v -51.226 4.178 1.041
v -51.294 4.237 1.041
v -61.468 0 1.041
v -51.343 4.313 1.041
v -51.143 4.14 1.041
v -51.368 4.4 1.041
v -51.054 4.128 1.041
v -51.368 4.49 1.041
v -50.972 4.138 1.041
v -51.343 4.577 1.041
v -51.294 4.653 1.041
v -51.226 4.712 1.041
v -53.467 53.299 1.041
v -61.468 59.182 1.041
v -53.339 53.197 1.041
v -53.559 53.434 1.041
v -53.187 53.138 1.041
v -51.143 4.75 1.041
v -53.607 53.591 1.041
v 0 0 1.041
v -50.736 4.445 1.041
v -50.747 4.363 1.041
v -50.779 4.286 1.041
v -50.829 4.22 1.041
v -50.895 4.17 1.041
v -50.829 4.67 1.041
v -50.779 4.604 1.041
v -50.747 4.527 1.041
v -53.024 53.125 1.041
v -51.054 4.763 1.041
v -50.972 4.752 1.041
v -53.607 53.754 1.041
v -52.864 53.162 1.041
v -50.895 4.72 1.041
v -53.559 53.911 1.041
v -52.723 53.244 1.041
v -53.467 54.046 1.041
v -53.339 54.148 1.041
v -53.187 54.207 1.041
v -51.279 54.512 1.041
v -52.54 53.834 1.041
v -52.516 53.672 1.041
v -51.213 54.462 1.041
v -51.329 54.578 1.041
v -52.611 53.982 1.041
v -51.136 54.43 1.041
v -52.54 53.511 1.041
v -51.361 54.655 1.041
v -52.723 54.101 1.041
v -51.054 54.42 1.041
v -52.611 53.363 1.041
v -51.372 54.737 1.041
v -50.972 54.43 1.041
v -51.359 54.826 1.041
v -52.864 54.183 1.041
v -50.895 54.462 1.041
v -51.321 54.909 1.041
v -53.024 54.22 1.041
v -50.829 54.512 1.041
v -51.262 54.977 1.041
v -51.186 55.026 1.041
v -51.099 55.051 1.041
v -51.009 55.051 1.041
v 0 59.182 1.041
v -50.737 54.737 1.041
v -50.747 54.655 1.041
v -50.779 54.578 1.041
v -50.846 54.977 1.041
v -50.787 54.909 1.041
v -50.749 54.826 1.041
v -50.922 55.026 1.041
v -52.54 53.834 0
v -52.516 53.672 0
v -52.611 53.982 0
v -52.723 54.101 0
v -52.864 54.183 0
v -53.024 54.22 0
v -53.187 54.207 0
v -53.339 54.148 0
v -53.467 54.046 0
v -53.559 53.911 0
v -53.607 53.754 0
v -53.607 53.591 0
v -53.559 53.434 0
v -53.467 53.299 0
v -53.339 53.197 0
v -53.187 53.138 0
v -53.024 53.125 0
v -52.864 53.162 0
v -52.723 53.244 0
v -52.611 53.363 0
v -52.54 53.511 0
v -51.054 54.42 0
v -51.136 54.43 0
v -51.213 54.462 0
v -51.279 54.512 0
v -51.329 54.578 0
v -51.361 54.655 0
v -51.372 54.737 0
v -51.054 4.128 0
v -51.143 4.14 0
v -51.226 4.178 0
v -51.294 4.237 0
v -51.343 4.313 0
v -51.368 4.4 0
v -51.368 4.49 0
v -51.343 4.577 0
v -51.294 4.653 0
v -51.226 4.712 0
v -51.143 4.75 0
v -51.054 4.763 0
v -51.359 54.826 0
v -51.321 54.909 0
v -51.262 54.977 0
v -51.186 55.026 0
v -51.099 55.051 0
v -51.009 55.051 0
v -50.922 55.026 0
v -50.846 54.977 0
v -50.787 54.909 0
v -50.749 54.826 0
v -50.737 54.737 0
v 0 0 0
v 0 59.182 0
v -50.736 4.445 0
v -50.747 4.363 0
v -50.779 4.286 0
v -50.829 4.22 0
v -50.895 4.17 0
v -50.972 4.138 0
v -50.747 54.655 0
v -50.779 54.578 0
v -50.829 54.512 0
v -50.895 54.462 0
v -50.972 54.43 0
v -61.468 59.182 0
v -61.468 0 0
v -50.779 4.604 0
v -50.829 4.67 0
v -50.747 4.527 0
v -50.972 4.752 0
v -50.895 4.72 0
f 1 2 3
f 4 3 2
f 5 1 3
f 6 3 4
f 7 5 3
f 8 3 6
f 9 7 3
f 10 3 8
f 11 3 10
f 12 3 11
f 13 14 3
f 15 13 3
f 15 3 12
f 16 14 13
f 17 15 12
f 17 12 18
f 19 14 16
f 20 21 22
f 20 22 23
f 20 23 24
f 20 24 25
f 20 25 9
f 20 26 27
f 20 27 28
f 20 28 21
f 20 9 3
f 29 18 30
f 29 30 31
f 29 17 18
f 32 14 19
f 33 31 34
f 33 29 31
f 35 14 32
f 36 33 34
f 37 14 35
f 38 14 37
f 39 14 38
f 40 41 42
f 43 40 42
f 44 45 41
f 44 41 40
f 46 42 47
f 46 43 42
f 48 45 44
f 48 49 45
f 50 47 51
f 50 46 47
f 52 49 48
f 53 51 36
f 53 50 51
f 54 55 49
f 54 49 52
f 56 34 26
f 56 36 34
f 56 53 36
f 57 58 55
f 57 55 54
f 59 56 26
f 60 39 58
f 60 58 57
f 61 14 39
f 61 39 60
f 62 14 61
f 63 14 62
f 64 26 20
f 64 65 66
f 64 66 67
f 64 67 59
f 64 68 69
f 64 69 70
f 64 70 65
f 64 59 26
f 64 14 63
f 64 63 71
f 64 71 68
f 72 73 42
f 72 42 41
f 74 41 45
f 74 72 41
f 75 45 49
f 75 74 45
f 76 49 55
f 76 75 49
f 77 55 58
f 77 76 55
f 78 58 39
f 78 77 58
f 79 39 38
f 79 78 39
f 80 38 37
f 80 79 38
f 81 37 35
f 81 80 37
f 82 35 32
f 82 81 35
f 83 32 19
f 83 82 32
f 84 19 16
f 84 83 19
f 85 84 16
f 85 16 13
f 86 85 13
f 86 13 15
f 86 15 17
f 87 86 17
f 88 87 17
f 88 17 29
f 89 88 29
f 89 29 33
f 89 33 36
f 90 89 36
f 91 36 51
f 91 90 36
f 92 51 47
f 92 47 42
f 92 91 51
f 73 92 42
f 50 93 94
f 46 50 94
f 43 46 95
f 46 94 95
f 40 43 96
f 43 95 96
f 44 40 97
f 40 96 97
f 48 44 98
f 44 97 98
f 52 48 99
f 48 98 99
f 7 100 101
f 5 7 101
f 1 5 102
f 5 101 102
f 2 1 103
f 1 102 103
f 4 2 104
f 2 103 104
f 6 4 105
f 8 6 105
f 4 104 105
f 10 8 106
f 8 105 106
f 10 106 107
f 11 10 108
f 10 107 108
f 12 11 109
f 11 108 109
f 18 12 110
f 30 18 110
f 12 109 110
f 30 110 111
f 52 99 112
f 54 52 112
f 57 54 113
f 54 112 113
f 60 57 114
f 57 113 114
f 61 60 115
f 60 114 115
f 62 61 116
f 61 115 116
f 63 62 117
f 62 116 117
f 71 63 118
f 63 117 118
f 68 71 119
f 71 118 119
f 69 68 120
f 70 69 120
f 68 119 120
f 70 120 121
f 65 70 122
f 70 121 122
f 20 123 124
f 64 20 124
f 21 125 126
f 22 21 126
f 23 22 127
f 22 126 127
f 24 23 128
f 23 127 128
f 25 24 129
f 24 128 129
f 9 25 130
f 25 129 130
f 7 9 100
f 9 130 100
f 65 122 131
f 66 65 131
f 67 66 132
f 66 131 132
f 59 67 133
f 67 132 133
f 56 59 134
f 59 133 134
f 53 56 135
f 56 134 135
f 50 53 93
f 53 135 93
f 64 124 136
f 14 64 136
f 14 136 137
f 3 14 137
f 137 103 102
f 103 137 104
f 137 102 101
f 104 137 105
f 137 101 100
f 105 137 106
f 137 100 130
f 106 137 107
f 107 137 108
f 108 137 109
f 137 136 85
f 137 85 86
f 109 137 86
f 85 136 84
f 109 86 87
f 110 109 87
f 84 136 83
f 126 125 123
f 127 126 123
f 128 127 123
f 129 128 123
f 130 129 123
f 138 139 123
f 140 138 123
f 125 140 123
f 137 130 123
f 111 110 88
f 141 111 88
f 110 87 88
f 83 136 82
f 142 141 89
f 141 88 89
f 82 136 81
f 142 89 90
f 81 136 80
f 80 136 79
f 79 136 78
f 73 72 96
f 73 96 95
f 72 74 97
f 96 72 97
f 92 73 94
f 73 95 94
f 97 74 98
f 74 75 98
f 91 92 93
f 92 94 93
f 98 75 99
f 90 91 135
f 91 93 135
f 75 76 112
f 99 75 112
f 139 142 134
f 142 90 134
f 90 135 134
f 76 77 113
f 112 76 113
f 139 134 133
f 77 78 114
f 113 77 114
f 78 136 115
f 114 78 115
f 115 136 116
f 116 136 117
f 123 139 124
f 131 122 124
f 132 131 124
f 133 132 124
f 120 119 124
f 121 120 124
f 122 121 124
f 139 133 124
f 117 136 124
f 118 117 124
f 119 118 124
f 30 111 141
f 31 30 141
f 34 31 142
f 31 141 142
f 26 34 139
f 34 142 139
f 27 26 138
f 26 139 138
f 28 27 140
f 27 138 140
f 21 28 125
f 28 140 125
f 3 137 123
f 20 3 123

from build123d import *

# Parameters (mm, degrees)
F0_R     = 0.5486564272
F1_DEPTH = 1.0414


with BuildPart() as f1:
    # F0 (on Top) → F1 (new body)
    with BuildSketch(Plane.XY):
        with BuildLine():
            Line((-51.054, 0), (0, 0))
            Line((0, 0), (0, 59.182))
            Line((0, 59.182), (-61.468, 59.182))
            Line((-61.468, 59.182), (-61.468, 54.737))
            Line((-61.468, 54.737), (-51.3715, 54.737))
            ThreePointArc((-51.3715, 54.737), (-51.054, 55.0545), (-50.7365, 54.737))
            ThreePointArc((-50.7365, 54.737), (-50.829493597, 54.512493597), (-51.054, 54.4195))
            Line((-51.054, 54.4195), (-51.054, 4.7625))
            ThreePointArc((-51.054, 4.7625), (-50.829493597, 4.669506403), (-50.7365, 4.445))
            ThreePointArc((-50.7365, 4.445), (-50.829493597, 4.220493597), (-51.054, 4.1275))
            Line((-51.054, 4.1275), (-51.054, 0))
        make_face()
        with BuildLine():
            Line((-61.468, 0), (-51.054, 0))
            Line((-51.054, 0), (-51.054, 4.1275))
            ThreePointArc((-51.054, 4.1275), (-51.3715, 4.445), (-51.054, 4.7625))
            Line((-51.054, 4.7625), (-51.054, 54.4195))
            ThreePointArc((-51.054, 54.4195), (-51.278506403, 54.512493597), (-51.3715, 54.737))
            Line((-51.3715, 54.737), (-61.468, 54.737))
            Line((-61.468, 54.737), (-61.468, 0))
        make_face()
        with Locations((-53.0647188425, 53.6724701524)):
            Circle(F0_R, mode=Mode.SUBTRACT)
    extrude(amount=F1_DEPTH)


solid = f1.part
